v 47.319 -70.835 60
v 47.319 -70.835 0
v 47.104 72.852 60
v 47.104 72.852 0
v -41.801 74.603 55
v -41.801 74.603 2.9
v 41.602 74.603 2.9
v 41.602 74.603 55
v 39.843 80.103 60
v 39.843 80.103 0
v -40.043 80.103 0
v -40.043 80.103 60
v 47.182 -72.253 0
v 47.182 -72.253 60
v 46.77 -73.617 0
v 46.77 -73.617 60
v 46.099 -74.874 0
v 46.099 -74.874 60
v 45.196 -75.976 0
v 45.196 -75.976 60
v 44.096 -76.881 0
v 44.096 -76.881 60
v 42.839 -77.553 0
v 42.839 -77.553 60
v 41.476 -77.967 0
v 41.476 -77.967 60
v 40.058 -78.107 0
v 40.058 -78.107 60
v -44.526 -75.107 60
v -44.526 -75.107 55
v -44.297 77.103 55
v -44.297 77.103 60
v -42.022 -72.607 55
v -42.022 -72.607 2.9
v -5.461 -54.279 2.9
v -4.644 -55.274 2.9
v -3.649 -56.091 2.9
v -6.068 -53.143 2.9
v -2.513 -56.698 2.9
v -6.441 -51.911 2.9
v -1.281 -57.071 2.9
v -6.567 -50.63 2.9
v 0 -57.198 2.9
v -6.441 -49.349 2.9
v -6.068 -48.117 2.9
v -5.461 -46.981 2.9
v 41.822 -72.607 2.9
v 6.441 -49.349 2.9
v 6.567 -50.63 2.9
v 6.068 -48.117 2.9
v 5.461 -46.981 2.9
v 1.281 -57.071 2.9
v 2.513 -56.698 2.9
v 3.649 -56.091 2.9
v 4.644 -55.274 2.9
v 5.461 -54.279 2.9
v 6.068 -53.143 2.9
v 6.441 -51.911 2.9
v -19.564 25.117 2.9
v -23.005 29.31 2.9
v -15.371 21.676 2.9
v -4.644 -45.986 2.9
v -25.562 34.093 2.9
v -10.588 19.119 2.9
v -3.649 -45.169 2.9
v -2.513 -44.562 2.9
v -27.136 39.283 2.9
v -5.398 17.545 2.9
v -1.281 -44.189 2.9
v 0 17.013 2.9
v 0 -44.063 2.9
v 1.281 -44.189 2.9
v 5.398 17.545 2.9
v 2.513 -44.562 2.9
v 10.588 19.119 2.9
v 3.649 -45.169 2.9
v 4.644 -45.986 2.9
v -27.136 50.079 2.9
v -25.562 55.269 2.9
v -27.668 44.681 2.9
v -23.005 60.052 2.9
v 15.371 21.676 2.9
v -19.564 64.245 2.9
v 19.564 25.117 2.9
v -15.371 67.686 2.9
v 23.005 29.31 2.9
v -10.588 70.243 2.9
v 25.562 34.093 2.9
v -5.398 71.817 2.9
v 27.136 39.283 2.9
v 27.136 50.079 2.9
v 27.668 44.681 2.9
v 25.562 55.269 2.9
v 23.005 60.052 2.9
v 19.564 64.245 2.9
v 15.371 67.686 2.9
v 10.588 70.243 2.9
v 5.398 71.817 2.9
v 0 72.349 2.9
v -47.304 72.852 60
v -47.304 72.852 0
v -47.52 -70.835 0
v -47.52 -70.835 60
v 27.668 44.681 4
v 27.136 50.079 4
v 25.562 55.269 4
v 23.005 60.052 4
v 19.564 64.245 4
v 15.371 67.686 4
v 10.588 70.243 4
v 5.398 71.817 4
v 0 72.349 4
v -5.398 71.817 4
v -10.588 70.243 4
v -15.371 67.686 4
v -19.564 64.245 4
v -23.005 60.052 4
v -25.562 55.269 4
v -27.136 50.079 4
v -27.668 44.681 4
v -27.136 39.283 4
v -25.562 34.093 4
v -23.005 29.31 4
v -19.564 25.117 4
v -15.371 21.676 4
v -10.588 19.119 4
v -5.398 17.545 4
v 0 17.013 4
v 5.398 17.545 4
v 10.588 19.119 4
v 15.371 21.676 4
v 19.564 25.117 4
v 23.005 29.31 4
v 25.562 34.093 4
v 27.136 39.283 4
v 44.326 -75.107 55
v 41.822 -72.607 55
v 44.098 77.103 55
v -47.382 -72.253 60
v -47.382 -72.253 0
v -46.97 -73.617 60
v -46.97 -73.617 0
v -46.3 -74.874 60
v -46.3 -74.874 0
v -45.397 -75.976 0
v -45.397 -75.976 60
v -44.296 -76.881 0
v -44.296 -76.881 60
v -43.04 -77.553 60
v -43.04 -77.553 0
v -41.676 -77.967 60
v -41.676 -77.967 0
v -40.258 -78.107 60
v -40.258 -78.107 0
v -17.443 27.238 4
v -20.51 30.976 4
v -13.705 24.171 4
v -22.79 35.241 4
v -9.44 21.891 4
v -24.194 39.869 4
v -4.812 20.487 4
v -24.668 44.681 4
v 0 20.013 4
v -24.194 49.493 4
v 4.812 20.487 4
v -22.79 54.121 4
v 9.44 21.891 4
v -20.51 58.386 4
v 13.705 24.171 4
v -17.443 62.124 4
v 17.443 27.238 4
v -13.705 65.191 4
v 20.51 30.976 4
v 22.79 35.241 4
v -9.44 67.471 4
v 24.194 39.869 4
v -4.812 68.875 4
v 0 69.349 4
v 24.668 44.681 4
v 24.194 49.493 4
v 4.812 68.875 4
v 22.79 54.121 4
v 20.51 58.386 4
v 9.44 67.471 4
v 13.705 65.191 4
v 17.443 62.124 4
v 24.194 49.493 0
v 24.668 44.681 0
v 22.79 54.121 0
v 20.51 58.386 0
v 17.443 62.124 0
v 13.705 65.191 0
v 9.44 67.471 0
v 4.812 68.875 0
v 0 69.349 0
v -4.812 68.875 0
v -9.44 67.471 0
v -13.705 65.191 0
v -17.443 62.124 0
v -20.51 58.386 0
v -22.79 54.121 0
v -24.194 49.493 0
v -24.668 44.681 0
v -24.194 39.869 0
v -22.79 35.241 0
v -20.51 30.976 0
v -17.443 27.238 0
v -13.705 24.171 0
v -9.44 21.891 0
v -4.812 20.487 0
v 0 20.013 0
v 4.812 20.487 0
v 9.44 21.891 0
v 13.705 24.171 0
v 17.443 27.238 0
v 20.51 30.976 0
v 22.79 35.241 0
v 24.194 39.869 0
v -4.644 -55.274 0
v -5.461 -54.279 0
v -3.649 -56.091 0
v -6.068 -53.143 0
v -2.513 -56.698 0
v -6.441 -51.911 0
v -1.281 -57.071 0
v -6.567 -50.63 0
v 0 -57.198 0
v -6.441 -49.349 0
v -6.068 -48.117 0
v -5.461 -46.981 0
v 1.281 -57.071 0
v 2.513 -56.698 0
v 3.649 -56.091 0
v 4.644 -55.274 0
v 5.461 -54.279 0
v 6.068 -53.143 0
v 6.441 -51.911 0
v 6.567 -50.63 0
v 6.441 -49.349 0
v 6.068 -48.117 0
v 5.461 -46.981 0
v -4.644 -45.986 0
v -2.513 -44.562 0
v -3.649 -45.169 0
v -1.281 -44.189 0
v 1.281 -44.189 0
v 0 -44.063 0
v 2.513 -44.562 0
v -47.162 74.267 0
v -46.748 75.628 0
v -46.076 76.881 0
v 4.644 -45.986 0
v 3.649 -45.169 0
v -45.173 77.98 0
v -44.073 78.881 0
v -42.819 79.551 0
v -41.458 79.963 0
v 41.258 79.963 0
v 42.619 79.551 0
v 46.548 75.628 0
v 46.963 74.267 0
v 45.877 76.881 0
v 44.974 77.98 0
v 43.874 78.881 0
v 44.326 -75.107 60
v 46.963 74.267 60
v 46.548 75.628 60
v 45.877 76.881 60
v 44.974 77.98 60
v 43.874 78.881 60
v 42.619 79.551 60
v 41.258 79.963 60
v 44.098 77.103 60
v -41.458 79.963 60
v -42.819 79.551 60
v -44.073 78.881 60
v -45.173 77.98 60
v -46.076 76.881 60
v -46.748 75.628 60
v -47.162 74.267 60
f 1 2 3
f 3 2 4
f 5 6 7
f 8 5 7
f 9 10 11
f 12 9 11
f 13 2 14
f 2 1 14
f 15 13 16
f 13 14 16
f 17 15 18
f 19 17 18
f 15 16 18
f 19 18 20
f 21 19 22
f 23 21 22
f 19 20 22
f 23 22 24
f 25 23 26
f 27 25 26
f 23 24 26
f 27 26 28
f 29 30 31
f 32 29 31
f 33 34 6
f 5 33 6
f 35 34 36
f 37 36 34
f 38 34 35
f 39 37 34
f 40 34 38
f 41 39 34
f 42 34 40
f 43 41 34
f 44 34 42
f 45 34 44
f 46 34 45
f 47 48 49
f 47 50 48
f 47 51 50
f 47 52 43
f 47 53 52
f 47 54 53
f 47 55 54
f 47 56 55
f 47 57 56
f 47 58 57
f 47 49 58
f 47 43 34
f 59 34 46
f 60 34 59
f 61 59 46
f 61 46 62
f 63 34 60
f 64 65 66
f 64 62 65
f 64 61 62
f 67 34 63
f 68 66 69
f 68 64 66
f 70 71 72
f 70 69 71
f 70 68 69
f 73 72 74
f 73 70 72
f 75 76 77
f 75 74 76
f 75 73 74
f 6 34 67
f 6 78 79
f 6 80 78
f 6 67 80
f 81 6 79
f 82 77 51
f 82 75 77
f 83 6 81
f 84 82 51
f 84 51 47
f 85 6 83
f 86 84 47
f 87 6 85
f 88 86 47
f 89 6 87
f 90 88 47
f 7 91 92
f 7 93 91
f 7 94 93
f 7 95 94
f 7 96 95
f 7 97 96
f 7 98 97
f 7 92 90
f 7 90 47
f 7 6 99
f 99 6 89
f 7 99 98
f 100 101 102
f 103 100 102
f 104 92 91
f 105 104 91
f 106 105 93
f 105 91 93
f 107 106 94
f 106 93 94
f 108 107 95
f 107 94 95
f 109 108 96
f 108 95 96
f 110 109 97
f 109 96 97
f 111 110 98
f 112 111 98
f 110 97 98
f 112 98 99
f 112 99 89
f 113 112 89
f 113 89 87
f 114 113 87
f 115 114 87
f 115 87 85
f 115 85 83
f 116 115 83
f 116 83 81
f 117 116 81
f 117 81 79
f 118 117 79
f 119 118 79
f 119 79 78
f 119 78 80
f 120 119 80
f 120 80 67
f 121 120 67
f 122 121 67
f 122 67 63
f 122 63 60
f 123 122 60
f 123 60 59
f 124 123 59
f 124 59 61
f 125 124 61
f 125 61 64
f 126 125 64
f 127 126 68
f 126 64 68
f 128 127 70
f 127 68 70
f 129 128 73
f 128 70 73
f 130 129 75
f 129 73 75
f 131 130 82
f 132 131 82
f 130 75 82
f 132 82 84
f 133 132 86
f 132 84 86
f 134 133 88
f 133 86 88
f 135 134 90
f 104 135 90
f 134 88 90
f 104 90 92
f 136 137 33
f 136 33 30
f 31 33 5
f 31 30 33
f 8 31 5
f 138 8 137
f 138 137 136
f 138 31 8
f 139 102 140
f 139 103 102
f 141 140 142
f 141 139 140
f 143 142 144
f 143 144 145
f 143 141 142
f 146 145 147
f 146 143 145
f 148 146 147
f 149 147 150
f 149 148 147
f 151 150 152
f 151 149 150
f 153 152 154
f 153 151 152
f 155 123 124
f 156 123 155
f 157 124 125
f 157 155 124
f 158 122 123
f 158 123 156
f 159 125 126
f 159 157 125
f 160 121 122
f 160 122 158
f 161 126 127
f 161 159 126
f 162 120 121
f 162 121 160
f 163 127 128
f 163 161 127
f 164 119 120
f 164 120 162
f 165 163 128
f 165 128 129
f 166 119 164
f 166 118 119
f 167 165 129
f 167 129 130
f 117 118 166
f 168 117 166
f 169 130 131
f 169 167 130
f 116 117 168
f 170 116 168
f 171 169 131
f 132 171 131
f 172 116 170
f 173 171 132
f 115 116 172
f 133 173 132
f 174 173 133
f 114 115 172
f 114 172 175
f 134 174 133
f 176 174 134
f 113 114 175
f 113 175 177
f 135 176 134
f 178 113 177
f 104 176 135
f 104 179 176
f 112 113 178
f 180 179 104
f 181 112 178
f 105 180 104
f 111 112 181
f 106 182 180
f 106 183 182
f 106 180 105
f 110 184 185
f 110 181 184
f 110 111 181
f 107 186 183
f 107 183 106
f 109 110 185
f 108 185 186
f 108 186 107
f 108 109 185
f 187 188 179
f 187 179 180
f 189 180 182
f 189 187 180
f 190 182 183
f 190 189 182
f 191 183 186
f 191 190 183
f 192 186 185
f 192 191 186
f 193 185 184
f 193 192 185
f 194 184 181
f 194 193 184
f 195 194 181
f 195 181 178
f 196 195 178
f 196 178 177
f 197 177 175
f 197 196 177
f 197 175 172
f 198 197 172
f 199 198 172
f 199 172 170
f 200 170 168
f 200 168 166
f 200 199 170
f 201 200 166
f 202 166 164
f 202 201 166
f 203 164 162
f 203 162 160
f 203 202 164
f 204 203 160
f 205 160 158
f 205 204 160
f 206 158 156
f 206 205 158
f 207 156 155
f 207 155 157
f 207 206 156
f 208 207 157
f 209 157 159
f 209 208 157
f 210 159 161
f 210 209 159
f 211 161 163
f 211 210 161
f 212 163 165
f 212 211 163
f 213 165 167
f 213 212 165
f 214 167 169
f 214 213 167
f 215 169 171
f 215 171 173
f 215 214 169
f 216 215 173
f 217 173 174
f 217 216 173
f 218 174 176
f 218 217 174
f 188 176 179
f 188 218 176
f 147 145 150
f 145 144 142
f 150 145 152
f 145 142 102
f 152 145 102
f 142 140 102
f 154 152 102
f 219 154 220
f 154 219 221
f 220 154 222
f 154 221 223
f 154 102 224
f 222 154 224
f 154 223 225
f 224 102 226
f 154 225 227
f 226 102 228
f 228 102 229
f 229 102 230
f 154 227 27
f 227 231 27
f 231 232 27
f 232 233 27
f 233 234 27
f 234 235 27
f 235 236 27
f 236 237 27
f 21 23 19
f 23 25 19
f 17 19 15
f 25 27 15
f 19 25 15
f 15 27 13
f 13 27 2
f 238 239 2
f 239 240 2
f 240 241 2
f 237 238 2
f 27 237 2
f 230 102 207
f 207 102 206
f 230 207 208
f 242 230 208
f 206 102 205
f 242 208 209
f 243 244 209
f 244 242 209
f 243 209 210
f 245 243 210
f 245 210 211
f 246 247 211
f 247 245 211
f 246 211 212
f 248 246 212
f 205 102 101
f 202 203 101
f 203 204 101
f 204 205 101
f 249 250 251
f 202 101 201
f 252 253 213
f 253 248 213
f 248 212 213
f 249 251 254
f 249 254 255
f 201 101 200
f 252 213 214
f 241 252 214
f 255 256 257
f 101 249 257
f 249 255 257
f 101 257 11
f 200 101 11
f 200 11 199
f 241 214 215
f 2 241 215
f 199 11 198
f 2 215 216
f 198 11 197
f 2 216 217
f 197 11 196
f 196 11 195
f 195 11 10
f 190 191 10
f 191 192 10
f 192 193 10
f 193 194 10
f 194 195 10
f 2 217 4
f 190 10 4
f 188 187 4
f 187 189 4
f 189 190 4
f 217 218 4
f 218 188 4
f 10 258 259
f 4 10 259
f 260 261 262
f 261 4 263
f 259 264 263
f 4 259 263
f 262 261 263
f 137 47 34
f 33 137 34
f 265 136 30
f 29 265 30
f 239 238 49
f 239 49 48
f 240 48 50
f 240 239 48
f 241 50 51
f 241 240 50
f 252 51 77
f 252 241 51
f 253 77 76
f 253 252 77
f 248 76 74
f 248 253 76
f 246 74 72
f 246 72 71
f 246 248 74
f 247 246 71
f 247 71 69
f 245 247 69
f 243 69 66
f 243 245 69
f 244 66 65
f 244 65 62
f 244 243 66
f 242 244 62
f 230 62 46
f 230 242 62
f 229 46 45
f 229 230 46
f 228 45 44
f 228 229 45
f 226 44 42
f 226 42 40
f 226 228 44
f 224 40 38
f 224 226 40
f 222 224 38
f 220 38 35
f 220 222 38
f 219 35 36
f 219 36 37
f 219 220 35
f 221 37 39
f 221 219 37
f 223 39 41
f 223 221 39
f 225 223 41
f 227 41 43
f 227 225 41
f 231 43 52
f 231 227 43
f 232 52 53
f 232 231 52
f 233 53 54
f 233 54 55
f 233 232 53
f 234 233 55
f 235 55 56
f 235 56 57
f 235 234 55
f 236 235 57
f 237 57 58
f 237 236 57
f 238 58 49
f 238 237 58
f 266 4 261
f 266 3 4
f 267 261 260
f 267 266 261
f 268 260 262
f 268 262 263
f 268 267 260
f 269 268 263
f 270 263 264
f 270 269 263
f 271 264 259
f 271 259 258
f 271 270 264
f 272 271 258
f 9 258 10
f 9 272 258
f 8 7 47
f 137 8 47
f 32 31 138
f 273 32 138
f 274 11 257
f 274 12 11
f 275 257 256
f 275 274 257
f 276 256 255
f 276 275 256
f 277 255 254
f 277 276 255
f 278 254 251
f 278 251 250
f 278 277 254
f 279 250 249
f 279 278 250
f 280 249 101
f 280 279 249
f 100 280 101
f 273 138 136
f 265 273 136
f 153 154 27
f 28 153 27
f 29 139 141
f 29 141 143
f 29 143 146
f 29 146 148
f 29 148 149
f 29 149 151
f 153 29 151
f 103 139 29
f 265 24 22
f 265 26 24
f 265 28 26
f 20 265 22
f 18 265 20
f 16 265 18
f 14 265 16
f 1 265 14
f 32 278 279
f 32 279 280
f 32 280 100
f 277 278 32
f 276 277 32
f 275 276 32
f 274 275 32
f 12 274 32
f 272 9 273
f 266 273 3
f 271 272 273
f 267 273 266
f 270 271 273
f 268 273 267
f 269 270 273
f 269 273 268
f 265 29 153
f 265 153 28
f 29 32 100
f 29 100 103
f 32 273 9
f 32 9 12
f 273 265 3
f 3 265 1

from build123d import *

# Parameters (mm, degrees)
F1_DEPTH = 60
F2_DEPTH = 55
F0_R     = 27.667587
F0_R_2   = 24.667588
F3_DEPTH = 4
F0_R_3   = 6.567471
F4_DEPTH = 2.9
F5_R     = 7.261182


with BuildPart() as f1:
    # F0 (on Top) → F1 (new body)
    with BuildSketch(Plane.XY):
        Polygon((47.330219, -78.107089), (47.093301, 80.102593), (-47.29298, 80.102593), (-47.530543, -78.107089), align=None)
        Polygon((-44.526036, -75.10709), (-44.297483, 77.102594), (44.097792, 77.102594), (44.325725, -75.10709), align=None, mode=Mode.SUBTRACT)
    extrude(amount=F1_DEPTH)

    # F0 (on Top) → F2 (join)
    with BuildSketch(Plane.XY):
        Polygon((44.097792, 77.102594), (-44.297483, 77.102594), (-44.526036, -75.10709), (44.325725, -75.10709), align=None)
        Polygon((-42.02228, -72.60709), (-41.801234, 74.602594), (41.601533, 74.602594), (41.821978, -72.60709), align=None, mode=Mode.SUBTRACT)
    extrude(amount=F2_DEPTH)



with BuildPart() as f3:
    # F0 (on Top) → F3 (new body)
    with BuildSketch(Plane.XY):
        with Locations((0, 44.681013)):
            Circle(F0_R)
        with Locations((0, 44.681013)):
            Circle(F0_R_2, mode=Mode.SUBTRACT)
    extrude(amount=F3_DEPTH)


with BuildPart() as f1_1:
    add(f1.part)

    add(f3.part)  # F4 merges F3
    # F0 (on Top) → F4 (join)
    with BuildSketch(Plane.XY):
        Polygon((41.601533, 74.602594), (-41.801234, 74.602594), (-42.02228, -72.60709), (41.821978, -72.60709), align=None)
        with Locations((0, -50.630033)):
            Circle(F0_R_3, mode=Mode.SUBTRACT)
        with Locations((0, 44.681013)):
            Circle(F0_R, mode=Mode.SUBTRACT)
    extrude(amount=F4_DEPTH)

    # F5
    f5_edges = [f1_1.edges().sort_by_distance(p)[0] for p in [
        (47.330219, -78.107089, 30),
        (-47.530543, -78.107089, 30),
        (-47.29298, 80.102593, 30),
        (47.093301, 80.102593, 30),
    ]]
    fillet(f5_edges, radius=F5_R)


solid = f1_1.part
